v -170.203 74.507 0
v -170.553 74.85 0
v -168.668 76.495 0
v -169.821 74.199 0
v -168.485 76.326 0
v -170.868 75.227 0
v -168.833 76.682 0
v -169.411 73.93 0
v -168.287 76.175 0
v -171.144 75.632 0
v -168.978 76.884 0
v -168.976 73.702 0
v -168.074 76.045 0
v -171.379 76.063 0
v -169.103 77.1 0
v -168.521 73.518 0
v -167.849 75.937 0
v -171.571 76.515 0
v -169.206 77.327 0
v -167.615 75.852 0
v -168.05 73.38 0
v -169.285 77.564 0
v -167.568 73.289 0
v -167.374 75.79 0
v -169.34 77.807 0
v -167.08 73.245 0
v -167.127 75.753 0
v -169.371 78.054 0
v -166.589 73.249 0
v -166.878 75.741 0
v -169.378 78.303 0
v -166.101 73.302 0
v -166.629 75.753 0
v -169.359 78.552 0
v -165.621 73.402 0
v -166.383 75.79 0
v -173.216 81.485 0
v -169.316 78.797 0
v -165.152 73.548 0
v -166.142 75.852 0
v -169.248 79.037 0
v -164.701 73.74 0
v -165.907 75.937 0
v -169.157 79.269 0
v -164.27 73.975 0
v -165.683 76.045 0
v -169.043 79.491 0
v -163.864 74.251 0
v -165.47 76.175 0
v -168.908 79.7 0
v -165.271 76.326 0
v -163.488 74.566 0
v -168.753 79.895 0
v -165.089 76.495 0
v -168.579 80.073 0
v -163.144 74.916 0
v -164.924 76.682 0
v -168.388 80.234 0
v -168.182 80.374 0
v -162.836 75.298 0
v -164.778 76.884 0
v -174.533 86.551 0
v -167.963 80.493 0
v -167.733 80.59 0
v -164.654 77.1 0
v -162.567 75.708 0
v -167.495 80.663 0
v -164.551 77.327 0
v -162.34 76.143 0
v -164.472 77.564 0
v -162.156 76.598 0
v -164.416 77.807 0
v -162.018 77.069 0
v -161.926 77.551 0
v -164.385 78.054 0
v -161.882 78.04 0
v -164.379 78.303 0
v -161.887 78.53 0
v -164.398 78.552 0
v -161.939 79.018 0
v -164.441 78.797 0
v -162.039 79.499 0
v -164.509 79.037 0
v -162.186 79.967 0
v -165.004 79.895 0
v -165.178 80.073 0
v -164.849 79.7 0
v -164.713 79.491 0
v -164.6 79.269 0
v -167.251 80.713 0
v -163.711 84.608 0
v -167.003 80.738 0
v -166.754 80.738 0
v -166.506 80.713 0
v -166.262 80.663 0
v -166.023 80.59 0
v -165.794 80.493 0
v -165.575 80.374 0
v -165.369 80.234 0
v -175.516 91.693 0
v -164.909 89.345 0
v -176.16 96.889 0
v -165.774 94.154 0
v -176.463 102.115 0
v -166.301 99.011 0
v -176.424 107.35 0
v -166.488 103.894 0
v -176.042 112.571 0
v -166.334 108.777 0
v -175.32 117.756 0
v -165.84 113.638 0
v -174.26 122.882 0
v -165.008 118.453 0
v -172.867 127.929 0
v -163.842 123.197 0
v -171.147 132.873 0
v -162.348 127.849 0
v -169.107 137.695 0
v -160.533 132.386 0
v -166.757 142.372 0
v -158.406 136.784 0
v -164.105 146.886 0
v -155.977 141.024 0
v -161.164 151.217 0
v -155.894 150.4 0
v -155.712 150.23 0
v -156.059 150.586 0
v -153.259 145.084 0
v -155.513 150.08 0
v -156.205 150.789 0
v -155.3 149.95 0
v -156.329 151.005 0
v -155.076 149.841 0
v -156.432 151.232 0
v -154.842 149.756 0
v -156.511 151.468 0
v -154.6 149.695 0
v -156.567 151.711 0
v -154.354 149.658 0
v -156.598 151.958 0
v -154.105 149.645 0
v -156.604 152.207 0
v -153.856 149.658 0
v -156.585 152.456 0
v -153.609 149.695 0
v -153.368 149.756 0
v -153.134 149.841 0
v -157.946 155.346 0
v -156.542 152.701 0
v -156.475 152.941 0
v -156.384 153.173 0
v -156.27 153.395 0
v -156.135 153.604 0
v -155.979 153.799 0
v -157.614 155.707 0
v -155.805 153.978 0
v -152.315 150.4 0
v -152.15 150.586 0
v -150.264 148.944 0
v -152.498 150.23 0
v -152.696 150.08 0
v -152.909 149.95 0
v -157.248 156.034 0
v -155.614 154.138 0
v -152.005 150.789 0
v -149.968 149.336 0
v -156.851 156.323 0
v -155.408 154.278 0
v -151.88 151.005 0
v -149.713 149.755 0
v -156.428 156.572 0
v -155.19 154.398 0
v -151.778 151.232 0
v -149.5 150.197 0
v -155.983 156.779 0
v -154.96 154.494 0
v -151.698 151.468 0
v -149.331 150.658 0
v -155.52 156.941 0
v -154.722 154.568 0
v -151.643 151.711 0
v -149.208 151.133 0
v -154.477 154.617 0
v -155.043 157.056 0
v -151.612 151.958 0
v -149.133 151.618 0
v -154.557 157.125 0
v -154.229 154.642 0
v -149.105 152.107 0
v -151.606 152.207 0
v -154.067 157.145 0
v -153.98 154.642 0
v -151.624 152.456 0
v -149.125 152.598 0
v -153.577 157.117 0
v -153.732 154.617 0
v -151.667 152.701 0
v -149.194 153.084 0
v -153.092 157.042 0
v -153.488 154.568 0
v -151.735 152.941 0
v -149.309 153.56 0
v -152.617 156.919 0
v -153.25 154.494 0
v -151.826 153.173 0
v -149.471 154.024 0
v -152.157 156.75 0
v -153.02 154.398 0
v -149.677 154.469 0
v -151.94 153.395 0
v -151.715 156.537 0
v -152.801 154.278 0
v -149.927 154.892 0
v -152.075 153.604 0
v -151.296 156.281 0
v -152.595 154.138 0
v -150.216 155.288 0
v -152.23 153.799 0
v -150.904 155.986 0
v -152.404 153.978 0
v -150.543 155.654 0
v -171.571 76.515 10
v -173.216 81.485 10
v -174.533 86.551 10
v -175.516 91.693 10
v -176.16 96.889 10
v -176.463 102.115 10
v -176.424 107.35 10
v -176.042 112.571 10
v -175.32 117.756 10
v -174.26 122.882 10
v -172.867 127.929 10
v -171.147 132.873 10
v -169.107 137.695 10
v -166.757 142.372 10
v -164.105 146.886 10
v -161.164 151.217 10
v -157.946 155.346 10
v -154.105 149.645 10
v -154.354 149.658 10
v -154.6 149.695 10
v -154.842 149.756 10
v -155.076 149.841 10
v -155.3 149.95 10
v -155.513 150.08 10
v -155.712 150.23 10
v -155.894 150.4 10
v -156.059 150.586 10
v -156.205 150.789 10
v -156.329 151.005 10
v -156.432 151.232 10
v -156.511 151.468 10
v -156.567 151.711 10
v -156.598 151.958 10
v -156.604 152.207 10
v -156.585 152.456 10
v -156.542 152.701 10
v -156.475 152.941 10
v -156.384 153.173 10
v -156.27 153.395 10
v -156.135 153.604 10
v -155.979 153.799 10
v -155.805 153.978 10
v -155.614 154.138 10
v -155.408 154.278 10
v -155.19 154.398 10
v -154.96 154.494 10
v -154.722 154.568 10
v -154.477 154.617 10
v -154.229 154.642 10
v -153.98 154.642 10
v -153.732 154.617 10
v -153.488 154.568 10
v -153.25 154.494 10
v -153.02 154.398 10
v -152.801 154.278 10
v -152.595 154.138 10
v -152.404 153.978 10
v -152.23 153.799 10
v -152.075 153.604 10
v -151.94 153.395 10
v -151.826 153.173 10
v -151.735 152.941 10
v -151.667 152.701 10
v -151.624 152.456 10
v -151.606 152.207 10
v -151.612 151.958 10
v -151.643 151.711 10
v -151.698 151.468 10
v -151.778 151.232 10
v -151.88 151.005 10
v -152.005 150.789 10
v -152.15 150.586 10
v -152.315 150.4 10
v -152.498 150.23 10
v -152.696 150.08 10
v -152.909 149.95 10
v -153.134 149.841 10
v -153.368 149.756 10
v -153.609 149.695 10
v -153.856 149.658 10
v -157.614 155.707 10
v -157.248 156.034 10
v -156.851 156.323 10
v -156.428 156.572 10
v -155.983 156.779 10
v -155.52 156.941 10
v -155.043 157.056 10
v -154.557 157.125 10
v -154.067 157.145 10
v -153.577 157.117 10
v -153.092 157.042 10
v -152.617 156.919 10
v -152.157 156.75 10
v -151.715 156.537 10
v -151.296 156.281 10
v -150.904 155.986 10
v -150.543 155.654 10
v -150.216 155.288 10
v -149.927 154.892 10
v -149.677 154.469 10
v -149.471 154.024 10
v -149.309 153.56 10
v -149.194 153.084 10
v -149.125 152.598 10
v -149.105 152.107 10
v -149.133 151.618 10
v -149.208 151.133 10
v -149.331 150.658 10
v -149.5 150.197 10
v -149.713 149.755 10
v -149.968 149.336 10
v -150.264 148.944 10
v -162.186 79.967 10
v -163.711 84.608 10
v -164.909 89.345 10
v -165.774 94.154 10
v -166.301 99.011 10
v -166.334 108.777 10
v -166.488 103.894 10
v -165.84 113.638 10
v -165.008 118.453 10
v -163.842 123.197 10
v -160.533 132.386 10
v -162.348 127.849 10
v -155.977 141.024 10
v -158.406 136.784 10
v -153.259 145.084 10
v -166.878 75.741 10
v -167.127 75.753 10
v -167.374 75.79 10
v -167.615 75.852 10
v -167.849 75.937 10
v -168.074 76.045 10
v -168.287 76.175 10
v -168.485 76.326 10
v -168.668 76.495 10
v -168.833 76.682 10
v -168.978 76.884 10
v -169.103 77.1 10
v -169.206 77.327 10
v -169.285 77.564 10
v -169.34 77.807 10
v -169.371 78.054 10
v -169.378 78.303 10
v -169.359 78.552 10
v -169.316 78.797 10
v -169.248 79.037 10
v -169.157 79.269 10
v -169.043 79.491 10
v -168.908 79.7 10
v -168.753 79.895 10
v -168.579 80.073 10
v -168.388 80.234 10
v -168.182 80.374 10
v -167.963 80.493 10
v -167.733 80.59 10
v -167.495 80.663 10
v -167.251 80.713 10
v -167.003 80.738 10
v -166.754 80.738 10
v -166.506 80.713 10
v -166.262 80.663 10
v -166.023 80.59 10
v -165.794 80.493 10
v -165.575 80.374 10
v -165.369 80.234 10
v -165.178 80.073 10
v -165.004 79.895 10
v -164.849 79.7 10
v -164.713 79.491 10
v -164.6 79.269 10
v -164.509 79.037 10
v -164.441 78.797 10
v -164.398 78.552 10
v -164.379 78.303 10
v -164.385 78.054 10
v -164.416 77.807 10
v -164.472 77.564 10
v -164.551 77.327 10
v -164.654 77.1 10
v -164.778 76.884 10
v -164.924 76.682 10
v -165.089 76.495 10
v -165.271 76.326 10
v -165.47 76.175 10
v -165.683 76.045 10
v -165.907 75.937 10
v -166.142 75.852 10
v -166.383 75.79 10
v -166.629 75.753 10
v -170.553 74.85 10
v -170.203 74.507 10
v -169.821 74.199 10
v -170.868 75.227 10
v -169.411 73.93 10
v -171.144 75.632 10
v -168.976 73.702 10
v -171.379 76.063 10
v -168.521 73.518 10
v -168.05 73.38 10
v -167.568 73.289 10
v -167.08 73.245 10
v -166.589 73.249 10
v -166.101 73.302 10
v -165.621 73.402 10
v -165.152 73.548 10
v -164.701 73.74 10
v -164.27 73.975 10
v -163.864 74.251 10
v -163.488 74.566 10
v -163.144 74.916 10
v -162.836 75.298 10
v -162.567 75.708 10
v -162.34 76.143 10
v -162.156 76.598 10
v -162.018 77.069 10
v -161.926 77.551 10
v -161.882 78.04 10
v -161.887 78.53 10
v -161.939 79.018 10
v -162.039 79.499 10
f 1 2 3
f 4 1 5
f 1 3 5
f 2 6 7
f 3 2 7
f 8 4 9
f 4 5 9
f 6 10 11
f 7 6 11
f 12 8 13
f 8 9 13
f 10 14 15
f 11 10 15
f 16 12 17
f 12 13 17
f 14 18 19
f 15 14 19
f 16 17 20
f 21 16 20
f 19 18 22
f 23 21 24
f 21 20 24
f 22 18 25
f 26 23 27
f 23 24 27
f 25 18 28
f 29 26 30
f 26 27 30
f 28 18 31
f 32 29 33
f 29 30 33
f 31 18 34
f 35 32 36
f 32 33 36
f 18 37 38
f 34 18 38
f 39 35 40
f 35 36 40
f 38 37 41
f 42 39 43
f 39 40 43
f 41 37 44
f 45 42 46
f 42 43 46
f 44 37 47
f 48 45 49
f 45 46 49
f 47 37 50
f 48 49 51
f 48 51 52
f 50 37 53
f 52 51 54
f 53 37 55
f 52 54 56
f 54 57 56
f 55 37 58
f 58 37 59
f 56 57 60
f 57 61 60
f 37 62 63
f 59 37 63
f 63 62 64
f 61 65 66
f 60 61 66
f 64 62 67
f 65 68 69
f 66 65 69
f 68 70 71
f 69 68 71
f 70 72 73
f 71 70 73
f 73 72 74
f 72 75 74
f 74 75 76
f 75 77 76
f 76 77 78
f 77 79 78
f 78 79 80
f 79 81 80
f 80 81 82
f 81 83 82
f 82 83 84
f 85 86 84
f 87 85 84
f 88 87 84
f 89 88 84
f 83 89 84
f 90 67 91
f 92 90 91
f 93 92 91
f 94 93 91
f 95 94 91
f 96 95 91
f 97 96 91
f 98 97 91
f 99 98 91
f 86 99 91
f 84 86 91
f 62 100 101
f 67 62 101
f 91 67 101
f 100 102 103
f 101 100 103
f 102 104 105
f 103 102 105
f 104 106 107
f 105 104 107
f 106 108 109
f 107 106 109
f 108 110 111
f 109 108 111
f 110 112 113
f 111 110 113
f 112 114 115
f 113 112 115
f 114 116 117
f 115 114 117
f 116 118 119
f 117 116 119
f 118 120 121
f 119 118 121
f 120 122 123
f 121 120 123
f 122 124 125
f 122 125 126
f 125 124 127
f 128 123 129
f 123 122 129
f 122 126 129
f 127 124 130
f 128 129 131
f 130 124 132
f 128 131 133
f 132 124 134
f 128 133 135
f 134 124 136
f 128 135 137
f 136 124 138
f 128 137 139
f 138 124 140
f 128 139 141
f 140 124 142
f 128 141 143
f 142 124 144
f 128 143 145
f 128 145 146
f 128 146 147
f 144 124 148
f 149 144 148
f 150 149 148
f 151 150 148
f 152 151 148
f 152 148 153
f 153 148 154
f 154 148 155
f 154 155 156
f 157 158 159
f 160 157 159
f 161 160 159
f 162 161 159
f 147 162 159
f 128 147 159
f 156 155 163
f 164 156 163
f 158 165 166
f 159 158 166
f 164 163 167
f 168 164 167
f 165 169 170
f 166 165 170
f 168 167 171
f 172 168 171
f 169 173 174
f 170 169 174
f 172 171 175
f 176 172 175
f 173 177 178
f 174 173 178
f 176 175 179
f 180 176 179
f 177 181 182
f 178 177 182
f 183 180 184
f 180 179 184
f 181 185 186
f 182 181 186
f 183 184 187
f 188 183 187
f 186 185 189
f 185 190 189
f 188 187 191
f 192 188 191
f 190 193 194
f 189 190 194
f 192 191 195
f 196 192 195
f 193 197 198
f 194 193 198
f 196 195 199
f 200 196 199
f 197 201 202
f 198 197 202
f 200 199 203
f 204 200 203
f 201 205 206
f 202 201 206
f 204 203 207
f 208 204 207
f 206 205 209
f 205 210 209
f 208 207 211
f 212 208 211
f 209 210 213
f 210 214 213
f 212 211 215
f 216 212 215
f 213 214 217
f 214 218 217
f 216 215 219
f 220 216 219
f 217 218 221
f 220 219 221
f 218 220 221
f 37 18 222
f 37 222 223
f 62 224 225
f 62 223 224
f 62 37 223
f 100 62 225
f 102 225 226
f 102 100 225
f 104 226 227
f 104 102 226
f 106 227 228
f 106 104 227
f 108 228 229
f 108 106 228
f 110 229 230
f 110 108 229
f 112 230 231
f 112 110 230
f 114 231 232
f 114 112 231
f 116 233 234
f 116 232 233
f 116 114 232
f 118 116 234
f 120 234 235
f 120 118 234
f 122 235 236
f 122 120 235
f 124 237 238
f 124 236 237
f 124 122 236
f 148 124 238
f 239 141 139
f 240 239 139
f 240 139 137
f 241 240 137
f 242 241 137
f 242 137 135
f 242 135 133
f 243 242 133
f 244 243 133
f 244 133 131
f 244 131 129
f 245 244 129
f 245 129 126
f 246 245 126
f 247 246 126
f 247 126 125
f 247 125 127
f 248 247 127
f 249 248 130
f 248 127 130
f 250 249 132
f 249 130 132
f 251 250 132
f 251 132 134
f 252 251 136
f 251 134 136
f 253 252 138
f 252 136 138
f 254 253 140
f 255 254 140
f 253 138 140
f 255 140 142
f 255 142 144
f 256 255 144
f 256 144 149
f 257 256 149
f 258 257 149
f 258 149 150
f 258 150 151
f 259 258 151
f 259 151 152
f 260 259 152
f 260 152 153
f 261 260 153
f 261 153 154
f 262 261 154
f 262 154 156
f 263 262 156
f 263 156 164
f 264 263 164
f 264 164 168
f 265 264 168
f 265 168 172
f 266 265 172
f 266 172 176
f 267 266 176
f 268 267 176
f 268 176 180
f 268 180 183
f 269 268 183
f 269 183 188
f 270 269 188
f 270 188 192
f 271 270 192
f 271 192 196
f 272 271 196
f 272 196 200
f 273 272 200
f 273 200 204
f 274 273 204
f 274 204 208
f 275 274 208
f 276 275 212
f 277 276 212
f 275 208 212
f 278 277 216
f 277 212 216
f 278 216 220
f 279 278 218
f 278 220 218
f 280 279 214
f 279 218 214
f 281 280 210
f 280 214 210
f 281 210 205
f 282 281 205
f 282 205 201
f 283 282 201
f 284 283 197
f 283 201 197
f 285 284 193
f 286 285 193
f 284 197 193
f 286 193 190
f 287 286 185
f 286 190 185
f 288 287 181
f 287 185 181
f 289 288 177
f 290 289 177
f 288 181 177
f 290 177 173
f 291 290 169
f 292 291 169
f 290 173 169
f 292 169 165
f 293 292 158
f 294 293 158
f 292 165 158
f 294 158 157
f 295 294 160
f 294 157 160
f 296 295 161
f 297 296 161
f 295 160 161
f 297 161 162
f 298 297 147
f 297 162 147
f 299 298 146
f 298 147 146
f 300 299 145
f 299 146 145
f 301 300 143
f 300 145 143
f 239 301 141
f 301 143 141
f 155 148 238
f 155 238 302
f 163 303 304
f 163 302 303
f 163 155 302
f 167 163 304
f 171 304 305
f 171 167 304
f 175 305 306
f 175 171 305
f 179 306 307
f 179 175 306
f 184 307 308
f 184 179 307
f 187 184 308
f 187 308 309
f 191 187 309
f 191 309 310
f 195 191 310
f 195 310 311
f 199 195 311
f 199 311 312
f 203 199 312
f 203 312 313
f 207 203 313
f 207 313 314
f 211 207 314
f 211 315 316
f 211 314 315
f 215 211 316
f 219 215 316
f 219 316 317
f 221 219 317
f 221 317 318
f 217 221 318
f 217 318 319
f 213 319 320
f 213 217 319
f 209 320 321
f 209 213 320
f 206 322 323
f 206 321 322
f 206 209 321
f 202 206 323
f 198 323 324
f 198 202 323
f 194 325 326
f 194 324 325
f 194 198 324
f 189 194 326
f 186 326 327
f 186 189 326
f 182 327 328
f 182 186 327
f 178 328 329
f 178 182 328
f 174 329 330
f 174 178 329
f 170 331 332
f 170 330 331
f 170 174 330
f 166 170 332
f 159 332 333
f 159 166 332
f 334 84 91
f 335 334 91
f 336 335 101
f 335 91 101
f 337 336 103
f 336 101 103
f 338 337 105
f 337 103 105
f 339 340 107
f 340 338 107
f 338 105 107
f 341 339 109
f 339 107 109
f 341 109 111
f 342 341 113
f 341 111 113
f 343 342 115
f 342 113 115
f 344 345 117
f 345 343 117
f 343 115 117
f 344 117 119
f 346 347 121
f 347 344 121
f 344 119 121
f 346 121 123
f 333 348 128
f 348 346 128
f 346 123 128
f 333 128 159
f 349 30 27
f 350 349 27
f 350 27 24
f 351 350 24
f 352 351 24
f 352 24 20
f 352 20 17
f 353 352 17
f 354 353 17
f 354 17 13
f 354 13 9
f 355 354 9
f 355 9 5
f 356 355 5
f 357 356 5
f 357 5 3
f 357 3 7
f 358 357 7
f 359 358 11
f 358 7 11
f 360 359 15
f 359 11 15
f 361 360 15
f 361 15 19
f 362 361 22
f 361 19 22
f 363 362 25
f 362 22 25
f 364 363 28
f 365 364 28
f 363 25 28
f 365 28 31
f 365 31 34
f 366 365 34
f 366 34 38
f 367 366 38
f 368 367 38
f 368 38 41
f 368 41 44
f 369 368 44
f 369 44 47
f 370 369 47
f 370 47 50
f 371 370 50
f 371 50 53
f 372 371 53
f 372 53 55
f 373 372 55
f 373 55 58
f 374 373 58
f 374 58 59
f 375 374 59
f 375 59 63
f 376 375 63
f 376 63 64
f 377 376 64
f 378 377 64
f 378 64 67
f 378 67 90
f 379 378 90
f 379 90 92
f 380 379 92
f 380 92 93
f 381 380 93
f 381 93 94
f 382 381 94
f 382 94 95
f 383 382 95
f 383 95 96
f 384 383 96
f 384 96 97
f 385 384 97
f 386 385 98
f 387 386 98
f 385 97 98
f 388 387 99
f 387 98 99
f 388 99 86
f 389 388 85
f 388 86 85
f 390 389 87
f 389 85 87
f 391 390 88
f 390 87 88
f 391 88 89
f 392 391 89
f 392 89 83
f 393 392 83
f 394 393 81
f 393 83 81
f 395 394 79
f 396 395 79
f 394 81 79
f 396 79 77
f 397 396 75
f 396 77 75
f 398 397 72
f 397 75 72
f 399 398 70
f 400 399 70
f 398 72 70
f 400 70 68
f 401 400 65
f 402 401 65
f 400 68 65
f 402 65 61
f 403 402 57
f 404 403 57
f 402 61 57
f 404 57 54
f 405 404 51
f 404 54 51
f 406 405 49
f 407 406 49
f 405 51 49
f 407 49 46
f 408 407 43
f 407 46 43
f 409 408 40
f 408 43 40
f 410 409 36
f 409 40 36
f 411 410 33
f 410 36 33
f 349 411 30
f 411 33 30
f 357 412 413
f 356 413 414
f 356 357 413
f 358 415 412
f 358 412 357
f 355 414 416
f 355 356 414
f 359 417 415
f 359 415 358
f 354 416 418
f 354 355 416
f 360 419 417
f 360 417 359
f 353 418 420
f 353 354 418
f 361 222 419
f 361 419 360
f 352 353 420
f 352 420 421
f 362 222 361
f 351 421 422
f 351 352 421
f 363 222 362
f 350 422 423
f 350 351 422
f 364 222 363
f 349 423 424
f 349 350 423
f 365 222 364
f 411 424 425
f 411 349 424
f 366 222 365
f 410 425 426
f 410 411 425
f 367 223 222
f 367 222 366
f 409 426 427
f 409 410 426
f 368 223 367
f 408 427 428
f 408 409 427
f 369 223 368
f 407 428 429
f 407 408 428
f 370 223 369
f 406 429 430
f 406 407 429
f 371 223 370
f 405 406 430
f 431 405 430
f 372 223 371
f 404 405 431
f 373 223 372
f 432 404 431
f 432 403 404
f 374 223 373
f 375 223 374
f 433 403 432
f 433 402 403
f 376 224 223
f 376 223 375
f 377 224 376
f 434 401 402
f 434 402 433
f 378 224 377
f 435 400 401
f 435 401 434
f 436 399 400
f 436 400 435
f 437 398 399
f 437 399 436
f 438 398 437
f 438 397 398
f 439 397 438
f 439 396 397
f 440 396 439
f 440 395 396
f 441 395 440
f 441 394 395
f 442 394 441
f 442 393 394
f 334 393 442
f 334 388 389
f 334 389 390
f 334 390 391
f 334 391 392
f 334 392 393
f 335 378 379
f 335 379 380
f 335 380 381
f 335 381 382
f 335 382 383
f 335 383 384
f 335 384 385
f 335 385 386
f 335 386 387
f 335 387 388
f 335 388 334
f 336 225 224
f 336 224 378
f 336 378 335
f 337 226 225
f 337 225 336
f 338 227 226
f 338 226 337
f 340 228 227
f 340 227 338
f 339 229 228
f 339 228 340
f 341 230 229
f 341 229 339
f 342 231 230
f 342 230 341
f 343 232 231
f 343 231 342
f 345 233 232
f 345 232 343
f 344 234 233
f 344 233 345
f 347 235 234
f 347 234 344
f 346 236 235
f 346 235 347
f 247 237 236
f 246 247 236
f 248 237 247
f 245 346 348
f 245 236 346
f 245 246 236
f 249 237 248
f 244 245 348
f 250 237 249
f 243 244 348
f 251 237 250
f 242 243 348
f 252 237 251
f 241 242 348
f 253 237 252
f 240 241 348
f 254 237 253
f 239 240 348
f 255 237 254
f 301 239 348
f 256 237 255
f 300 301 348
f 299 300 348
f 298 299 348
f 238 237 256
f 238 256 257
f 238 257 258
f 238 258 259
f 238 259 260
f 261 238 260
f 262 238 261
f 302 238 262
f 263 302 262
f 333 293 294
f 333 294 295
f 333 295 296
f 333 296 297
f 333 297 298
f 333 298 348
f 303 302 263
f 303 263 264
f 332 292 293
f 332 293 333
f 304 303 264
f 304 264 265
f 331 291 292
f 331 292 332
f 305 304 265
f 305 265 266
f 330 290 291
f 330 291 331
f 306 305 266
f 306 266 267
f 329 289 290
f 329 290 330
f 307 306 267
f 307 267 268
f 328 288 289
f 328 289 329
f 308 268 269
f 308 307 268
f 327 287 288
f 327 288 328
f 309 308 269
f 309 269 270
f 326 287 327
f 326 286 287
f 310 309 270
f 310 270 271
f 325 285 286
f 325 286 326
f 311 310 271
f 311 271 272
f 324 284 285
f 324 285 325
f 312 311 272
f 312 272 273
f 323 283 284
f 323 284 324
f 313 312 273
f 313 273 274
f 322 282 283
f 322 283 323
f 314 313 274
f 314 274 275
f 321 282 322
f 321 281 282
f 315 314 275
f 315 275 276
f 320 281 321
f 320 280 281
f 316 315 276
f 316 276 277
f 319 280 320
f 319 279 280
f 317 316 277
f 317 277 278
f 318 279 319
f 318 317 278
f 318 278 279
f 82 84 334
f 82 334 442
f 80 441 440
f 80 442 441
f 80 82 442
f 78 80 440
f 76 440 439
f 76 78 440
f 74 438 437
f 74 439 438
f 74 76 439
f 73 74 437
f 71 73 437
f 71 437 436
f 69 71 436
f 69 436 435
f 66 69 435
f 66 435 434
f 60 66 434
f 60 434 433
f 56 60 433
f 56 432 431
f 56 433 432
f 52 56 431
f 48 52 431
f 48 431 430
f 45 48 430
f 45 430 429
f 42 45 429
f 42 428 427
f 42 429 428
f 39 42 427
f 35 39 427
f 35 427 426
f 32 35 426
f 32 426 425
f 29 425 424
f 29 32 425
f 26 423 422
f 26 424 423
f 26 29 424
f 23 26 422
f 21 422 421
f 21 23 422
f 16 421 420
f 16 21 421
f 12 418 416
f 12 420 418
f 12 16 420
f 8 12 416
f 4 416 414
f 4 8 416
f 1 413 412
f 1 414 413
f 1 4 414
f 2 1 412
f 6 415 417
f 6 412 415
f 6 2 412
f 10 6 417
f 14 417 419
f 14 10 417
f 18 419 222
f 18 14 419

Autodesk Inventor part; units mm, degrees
ref_plane "YZ Plane" through (0, 0, 0) normal (1, 0, 0) x (0, 1, 0)
ref_plane "XZ Plane" through (0, 0, 0) normal (0, 1, 0) x (-1, 0, 0)
ref_plane "XY Plane" through (0, 0, 0) normal (0, 0, 1) x (1, 0, 0)
sketch "Sketch1" plane through (0, 0, 0) normal (0, 0, 1) x (1, 0, 0)
  arc A0 (-154.1048, 152.1451) -> (-166.8784, 78.2408) centre (-96.4886, 104.1307) ccw construction
  arc A1 (-157.9458, 155.346) -> (-171.571, 76.5148) centre (-96.4886, 104.1307) ccw
  arc A2 (-150.2637, 148.9441) -> (-162.1857, 79.9668) centre (-96.4886, 104.1307) ccw
  arc A3 (-150.2637, 148.9441) -> (-157.9458, 155.346) centre (-154.1048, 152.1451) ccw
  arc A4 (-171.571, 76.5148) -> (-162.1857, 79.9668) centre (-166.8784, 78.2408) ccw
  line L0 (-154.1048, 152.1451) -> (-96.4886, 104.1307) construction
  line L1 (-96.4886, 104.1307) -> (-166.8784, 78.2408) construction
  point P0 (0, 0)
  dimension "d1" = 75
  dimension "d2" = 10
  dimension "d5" = 60
extrude "Extrusion1" add sketch "Sketch1" along normal blind 10
sketch "Sketch2" plane through (0, 0, 10) normal (0, 0, 1) x (1, 0, 0)
  arc A0 (-157.9458, 155.346) -> (-171.571, 76.5148) centre (-96.4886, 104.1307) ccw projected
  arc A1 (-171.571, 76.5148) -> (-162.1857, 79.9668) centre (-166.8784, 78.2408) ccw projected
  arc A2 (-150.2637, 148.9441) -> (-162.1857, 79.9668) centre (-96.4886, 104.1307) ccw projected
  arc A3 (-150.2637, 148.9441) -> (-157.9458, 155.346) centre (-154.1048, 152.1451) ccw projected
  point P0 (0, 0)
hole "Hole1" at (-154.1048, 152.1451, 10) at (-166.8784, 78.2408, 10) direction (0, 0, -1) diameter 5 end through all
properties part number "ledeplate"
